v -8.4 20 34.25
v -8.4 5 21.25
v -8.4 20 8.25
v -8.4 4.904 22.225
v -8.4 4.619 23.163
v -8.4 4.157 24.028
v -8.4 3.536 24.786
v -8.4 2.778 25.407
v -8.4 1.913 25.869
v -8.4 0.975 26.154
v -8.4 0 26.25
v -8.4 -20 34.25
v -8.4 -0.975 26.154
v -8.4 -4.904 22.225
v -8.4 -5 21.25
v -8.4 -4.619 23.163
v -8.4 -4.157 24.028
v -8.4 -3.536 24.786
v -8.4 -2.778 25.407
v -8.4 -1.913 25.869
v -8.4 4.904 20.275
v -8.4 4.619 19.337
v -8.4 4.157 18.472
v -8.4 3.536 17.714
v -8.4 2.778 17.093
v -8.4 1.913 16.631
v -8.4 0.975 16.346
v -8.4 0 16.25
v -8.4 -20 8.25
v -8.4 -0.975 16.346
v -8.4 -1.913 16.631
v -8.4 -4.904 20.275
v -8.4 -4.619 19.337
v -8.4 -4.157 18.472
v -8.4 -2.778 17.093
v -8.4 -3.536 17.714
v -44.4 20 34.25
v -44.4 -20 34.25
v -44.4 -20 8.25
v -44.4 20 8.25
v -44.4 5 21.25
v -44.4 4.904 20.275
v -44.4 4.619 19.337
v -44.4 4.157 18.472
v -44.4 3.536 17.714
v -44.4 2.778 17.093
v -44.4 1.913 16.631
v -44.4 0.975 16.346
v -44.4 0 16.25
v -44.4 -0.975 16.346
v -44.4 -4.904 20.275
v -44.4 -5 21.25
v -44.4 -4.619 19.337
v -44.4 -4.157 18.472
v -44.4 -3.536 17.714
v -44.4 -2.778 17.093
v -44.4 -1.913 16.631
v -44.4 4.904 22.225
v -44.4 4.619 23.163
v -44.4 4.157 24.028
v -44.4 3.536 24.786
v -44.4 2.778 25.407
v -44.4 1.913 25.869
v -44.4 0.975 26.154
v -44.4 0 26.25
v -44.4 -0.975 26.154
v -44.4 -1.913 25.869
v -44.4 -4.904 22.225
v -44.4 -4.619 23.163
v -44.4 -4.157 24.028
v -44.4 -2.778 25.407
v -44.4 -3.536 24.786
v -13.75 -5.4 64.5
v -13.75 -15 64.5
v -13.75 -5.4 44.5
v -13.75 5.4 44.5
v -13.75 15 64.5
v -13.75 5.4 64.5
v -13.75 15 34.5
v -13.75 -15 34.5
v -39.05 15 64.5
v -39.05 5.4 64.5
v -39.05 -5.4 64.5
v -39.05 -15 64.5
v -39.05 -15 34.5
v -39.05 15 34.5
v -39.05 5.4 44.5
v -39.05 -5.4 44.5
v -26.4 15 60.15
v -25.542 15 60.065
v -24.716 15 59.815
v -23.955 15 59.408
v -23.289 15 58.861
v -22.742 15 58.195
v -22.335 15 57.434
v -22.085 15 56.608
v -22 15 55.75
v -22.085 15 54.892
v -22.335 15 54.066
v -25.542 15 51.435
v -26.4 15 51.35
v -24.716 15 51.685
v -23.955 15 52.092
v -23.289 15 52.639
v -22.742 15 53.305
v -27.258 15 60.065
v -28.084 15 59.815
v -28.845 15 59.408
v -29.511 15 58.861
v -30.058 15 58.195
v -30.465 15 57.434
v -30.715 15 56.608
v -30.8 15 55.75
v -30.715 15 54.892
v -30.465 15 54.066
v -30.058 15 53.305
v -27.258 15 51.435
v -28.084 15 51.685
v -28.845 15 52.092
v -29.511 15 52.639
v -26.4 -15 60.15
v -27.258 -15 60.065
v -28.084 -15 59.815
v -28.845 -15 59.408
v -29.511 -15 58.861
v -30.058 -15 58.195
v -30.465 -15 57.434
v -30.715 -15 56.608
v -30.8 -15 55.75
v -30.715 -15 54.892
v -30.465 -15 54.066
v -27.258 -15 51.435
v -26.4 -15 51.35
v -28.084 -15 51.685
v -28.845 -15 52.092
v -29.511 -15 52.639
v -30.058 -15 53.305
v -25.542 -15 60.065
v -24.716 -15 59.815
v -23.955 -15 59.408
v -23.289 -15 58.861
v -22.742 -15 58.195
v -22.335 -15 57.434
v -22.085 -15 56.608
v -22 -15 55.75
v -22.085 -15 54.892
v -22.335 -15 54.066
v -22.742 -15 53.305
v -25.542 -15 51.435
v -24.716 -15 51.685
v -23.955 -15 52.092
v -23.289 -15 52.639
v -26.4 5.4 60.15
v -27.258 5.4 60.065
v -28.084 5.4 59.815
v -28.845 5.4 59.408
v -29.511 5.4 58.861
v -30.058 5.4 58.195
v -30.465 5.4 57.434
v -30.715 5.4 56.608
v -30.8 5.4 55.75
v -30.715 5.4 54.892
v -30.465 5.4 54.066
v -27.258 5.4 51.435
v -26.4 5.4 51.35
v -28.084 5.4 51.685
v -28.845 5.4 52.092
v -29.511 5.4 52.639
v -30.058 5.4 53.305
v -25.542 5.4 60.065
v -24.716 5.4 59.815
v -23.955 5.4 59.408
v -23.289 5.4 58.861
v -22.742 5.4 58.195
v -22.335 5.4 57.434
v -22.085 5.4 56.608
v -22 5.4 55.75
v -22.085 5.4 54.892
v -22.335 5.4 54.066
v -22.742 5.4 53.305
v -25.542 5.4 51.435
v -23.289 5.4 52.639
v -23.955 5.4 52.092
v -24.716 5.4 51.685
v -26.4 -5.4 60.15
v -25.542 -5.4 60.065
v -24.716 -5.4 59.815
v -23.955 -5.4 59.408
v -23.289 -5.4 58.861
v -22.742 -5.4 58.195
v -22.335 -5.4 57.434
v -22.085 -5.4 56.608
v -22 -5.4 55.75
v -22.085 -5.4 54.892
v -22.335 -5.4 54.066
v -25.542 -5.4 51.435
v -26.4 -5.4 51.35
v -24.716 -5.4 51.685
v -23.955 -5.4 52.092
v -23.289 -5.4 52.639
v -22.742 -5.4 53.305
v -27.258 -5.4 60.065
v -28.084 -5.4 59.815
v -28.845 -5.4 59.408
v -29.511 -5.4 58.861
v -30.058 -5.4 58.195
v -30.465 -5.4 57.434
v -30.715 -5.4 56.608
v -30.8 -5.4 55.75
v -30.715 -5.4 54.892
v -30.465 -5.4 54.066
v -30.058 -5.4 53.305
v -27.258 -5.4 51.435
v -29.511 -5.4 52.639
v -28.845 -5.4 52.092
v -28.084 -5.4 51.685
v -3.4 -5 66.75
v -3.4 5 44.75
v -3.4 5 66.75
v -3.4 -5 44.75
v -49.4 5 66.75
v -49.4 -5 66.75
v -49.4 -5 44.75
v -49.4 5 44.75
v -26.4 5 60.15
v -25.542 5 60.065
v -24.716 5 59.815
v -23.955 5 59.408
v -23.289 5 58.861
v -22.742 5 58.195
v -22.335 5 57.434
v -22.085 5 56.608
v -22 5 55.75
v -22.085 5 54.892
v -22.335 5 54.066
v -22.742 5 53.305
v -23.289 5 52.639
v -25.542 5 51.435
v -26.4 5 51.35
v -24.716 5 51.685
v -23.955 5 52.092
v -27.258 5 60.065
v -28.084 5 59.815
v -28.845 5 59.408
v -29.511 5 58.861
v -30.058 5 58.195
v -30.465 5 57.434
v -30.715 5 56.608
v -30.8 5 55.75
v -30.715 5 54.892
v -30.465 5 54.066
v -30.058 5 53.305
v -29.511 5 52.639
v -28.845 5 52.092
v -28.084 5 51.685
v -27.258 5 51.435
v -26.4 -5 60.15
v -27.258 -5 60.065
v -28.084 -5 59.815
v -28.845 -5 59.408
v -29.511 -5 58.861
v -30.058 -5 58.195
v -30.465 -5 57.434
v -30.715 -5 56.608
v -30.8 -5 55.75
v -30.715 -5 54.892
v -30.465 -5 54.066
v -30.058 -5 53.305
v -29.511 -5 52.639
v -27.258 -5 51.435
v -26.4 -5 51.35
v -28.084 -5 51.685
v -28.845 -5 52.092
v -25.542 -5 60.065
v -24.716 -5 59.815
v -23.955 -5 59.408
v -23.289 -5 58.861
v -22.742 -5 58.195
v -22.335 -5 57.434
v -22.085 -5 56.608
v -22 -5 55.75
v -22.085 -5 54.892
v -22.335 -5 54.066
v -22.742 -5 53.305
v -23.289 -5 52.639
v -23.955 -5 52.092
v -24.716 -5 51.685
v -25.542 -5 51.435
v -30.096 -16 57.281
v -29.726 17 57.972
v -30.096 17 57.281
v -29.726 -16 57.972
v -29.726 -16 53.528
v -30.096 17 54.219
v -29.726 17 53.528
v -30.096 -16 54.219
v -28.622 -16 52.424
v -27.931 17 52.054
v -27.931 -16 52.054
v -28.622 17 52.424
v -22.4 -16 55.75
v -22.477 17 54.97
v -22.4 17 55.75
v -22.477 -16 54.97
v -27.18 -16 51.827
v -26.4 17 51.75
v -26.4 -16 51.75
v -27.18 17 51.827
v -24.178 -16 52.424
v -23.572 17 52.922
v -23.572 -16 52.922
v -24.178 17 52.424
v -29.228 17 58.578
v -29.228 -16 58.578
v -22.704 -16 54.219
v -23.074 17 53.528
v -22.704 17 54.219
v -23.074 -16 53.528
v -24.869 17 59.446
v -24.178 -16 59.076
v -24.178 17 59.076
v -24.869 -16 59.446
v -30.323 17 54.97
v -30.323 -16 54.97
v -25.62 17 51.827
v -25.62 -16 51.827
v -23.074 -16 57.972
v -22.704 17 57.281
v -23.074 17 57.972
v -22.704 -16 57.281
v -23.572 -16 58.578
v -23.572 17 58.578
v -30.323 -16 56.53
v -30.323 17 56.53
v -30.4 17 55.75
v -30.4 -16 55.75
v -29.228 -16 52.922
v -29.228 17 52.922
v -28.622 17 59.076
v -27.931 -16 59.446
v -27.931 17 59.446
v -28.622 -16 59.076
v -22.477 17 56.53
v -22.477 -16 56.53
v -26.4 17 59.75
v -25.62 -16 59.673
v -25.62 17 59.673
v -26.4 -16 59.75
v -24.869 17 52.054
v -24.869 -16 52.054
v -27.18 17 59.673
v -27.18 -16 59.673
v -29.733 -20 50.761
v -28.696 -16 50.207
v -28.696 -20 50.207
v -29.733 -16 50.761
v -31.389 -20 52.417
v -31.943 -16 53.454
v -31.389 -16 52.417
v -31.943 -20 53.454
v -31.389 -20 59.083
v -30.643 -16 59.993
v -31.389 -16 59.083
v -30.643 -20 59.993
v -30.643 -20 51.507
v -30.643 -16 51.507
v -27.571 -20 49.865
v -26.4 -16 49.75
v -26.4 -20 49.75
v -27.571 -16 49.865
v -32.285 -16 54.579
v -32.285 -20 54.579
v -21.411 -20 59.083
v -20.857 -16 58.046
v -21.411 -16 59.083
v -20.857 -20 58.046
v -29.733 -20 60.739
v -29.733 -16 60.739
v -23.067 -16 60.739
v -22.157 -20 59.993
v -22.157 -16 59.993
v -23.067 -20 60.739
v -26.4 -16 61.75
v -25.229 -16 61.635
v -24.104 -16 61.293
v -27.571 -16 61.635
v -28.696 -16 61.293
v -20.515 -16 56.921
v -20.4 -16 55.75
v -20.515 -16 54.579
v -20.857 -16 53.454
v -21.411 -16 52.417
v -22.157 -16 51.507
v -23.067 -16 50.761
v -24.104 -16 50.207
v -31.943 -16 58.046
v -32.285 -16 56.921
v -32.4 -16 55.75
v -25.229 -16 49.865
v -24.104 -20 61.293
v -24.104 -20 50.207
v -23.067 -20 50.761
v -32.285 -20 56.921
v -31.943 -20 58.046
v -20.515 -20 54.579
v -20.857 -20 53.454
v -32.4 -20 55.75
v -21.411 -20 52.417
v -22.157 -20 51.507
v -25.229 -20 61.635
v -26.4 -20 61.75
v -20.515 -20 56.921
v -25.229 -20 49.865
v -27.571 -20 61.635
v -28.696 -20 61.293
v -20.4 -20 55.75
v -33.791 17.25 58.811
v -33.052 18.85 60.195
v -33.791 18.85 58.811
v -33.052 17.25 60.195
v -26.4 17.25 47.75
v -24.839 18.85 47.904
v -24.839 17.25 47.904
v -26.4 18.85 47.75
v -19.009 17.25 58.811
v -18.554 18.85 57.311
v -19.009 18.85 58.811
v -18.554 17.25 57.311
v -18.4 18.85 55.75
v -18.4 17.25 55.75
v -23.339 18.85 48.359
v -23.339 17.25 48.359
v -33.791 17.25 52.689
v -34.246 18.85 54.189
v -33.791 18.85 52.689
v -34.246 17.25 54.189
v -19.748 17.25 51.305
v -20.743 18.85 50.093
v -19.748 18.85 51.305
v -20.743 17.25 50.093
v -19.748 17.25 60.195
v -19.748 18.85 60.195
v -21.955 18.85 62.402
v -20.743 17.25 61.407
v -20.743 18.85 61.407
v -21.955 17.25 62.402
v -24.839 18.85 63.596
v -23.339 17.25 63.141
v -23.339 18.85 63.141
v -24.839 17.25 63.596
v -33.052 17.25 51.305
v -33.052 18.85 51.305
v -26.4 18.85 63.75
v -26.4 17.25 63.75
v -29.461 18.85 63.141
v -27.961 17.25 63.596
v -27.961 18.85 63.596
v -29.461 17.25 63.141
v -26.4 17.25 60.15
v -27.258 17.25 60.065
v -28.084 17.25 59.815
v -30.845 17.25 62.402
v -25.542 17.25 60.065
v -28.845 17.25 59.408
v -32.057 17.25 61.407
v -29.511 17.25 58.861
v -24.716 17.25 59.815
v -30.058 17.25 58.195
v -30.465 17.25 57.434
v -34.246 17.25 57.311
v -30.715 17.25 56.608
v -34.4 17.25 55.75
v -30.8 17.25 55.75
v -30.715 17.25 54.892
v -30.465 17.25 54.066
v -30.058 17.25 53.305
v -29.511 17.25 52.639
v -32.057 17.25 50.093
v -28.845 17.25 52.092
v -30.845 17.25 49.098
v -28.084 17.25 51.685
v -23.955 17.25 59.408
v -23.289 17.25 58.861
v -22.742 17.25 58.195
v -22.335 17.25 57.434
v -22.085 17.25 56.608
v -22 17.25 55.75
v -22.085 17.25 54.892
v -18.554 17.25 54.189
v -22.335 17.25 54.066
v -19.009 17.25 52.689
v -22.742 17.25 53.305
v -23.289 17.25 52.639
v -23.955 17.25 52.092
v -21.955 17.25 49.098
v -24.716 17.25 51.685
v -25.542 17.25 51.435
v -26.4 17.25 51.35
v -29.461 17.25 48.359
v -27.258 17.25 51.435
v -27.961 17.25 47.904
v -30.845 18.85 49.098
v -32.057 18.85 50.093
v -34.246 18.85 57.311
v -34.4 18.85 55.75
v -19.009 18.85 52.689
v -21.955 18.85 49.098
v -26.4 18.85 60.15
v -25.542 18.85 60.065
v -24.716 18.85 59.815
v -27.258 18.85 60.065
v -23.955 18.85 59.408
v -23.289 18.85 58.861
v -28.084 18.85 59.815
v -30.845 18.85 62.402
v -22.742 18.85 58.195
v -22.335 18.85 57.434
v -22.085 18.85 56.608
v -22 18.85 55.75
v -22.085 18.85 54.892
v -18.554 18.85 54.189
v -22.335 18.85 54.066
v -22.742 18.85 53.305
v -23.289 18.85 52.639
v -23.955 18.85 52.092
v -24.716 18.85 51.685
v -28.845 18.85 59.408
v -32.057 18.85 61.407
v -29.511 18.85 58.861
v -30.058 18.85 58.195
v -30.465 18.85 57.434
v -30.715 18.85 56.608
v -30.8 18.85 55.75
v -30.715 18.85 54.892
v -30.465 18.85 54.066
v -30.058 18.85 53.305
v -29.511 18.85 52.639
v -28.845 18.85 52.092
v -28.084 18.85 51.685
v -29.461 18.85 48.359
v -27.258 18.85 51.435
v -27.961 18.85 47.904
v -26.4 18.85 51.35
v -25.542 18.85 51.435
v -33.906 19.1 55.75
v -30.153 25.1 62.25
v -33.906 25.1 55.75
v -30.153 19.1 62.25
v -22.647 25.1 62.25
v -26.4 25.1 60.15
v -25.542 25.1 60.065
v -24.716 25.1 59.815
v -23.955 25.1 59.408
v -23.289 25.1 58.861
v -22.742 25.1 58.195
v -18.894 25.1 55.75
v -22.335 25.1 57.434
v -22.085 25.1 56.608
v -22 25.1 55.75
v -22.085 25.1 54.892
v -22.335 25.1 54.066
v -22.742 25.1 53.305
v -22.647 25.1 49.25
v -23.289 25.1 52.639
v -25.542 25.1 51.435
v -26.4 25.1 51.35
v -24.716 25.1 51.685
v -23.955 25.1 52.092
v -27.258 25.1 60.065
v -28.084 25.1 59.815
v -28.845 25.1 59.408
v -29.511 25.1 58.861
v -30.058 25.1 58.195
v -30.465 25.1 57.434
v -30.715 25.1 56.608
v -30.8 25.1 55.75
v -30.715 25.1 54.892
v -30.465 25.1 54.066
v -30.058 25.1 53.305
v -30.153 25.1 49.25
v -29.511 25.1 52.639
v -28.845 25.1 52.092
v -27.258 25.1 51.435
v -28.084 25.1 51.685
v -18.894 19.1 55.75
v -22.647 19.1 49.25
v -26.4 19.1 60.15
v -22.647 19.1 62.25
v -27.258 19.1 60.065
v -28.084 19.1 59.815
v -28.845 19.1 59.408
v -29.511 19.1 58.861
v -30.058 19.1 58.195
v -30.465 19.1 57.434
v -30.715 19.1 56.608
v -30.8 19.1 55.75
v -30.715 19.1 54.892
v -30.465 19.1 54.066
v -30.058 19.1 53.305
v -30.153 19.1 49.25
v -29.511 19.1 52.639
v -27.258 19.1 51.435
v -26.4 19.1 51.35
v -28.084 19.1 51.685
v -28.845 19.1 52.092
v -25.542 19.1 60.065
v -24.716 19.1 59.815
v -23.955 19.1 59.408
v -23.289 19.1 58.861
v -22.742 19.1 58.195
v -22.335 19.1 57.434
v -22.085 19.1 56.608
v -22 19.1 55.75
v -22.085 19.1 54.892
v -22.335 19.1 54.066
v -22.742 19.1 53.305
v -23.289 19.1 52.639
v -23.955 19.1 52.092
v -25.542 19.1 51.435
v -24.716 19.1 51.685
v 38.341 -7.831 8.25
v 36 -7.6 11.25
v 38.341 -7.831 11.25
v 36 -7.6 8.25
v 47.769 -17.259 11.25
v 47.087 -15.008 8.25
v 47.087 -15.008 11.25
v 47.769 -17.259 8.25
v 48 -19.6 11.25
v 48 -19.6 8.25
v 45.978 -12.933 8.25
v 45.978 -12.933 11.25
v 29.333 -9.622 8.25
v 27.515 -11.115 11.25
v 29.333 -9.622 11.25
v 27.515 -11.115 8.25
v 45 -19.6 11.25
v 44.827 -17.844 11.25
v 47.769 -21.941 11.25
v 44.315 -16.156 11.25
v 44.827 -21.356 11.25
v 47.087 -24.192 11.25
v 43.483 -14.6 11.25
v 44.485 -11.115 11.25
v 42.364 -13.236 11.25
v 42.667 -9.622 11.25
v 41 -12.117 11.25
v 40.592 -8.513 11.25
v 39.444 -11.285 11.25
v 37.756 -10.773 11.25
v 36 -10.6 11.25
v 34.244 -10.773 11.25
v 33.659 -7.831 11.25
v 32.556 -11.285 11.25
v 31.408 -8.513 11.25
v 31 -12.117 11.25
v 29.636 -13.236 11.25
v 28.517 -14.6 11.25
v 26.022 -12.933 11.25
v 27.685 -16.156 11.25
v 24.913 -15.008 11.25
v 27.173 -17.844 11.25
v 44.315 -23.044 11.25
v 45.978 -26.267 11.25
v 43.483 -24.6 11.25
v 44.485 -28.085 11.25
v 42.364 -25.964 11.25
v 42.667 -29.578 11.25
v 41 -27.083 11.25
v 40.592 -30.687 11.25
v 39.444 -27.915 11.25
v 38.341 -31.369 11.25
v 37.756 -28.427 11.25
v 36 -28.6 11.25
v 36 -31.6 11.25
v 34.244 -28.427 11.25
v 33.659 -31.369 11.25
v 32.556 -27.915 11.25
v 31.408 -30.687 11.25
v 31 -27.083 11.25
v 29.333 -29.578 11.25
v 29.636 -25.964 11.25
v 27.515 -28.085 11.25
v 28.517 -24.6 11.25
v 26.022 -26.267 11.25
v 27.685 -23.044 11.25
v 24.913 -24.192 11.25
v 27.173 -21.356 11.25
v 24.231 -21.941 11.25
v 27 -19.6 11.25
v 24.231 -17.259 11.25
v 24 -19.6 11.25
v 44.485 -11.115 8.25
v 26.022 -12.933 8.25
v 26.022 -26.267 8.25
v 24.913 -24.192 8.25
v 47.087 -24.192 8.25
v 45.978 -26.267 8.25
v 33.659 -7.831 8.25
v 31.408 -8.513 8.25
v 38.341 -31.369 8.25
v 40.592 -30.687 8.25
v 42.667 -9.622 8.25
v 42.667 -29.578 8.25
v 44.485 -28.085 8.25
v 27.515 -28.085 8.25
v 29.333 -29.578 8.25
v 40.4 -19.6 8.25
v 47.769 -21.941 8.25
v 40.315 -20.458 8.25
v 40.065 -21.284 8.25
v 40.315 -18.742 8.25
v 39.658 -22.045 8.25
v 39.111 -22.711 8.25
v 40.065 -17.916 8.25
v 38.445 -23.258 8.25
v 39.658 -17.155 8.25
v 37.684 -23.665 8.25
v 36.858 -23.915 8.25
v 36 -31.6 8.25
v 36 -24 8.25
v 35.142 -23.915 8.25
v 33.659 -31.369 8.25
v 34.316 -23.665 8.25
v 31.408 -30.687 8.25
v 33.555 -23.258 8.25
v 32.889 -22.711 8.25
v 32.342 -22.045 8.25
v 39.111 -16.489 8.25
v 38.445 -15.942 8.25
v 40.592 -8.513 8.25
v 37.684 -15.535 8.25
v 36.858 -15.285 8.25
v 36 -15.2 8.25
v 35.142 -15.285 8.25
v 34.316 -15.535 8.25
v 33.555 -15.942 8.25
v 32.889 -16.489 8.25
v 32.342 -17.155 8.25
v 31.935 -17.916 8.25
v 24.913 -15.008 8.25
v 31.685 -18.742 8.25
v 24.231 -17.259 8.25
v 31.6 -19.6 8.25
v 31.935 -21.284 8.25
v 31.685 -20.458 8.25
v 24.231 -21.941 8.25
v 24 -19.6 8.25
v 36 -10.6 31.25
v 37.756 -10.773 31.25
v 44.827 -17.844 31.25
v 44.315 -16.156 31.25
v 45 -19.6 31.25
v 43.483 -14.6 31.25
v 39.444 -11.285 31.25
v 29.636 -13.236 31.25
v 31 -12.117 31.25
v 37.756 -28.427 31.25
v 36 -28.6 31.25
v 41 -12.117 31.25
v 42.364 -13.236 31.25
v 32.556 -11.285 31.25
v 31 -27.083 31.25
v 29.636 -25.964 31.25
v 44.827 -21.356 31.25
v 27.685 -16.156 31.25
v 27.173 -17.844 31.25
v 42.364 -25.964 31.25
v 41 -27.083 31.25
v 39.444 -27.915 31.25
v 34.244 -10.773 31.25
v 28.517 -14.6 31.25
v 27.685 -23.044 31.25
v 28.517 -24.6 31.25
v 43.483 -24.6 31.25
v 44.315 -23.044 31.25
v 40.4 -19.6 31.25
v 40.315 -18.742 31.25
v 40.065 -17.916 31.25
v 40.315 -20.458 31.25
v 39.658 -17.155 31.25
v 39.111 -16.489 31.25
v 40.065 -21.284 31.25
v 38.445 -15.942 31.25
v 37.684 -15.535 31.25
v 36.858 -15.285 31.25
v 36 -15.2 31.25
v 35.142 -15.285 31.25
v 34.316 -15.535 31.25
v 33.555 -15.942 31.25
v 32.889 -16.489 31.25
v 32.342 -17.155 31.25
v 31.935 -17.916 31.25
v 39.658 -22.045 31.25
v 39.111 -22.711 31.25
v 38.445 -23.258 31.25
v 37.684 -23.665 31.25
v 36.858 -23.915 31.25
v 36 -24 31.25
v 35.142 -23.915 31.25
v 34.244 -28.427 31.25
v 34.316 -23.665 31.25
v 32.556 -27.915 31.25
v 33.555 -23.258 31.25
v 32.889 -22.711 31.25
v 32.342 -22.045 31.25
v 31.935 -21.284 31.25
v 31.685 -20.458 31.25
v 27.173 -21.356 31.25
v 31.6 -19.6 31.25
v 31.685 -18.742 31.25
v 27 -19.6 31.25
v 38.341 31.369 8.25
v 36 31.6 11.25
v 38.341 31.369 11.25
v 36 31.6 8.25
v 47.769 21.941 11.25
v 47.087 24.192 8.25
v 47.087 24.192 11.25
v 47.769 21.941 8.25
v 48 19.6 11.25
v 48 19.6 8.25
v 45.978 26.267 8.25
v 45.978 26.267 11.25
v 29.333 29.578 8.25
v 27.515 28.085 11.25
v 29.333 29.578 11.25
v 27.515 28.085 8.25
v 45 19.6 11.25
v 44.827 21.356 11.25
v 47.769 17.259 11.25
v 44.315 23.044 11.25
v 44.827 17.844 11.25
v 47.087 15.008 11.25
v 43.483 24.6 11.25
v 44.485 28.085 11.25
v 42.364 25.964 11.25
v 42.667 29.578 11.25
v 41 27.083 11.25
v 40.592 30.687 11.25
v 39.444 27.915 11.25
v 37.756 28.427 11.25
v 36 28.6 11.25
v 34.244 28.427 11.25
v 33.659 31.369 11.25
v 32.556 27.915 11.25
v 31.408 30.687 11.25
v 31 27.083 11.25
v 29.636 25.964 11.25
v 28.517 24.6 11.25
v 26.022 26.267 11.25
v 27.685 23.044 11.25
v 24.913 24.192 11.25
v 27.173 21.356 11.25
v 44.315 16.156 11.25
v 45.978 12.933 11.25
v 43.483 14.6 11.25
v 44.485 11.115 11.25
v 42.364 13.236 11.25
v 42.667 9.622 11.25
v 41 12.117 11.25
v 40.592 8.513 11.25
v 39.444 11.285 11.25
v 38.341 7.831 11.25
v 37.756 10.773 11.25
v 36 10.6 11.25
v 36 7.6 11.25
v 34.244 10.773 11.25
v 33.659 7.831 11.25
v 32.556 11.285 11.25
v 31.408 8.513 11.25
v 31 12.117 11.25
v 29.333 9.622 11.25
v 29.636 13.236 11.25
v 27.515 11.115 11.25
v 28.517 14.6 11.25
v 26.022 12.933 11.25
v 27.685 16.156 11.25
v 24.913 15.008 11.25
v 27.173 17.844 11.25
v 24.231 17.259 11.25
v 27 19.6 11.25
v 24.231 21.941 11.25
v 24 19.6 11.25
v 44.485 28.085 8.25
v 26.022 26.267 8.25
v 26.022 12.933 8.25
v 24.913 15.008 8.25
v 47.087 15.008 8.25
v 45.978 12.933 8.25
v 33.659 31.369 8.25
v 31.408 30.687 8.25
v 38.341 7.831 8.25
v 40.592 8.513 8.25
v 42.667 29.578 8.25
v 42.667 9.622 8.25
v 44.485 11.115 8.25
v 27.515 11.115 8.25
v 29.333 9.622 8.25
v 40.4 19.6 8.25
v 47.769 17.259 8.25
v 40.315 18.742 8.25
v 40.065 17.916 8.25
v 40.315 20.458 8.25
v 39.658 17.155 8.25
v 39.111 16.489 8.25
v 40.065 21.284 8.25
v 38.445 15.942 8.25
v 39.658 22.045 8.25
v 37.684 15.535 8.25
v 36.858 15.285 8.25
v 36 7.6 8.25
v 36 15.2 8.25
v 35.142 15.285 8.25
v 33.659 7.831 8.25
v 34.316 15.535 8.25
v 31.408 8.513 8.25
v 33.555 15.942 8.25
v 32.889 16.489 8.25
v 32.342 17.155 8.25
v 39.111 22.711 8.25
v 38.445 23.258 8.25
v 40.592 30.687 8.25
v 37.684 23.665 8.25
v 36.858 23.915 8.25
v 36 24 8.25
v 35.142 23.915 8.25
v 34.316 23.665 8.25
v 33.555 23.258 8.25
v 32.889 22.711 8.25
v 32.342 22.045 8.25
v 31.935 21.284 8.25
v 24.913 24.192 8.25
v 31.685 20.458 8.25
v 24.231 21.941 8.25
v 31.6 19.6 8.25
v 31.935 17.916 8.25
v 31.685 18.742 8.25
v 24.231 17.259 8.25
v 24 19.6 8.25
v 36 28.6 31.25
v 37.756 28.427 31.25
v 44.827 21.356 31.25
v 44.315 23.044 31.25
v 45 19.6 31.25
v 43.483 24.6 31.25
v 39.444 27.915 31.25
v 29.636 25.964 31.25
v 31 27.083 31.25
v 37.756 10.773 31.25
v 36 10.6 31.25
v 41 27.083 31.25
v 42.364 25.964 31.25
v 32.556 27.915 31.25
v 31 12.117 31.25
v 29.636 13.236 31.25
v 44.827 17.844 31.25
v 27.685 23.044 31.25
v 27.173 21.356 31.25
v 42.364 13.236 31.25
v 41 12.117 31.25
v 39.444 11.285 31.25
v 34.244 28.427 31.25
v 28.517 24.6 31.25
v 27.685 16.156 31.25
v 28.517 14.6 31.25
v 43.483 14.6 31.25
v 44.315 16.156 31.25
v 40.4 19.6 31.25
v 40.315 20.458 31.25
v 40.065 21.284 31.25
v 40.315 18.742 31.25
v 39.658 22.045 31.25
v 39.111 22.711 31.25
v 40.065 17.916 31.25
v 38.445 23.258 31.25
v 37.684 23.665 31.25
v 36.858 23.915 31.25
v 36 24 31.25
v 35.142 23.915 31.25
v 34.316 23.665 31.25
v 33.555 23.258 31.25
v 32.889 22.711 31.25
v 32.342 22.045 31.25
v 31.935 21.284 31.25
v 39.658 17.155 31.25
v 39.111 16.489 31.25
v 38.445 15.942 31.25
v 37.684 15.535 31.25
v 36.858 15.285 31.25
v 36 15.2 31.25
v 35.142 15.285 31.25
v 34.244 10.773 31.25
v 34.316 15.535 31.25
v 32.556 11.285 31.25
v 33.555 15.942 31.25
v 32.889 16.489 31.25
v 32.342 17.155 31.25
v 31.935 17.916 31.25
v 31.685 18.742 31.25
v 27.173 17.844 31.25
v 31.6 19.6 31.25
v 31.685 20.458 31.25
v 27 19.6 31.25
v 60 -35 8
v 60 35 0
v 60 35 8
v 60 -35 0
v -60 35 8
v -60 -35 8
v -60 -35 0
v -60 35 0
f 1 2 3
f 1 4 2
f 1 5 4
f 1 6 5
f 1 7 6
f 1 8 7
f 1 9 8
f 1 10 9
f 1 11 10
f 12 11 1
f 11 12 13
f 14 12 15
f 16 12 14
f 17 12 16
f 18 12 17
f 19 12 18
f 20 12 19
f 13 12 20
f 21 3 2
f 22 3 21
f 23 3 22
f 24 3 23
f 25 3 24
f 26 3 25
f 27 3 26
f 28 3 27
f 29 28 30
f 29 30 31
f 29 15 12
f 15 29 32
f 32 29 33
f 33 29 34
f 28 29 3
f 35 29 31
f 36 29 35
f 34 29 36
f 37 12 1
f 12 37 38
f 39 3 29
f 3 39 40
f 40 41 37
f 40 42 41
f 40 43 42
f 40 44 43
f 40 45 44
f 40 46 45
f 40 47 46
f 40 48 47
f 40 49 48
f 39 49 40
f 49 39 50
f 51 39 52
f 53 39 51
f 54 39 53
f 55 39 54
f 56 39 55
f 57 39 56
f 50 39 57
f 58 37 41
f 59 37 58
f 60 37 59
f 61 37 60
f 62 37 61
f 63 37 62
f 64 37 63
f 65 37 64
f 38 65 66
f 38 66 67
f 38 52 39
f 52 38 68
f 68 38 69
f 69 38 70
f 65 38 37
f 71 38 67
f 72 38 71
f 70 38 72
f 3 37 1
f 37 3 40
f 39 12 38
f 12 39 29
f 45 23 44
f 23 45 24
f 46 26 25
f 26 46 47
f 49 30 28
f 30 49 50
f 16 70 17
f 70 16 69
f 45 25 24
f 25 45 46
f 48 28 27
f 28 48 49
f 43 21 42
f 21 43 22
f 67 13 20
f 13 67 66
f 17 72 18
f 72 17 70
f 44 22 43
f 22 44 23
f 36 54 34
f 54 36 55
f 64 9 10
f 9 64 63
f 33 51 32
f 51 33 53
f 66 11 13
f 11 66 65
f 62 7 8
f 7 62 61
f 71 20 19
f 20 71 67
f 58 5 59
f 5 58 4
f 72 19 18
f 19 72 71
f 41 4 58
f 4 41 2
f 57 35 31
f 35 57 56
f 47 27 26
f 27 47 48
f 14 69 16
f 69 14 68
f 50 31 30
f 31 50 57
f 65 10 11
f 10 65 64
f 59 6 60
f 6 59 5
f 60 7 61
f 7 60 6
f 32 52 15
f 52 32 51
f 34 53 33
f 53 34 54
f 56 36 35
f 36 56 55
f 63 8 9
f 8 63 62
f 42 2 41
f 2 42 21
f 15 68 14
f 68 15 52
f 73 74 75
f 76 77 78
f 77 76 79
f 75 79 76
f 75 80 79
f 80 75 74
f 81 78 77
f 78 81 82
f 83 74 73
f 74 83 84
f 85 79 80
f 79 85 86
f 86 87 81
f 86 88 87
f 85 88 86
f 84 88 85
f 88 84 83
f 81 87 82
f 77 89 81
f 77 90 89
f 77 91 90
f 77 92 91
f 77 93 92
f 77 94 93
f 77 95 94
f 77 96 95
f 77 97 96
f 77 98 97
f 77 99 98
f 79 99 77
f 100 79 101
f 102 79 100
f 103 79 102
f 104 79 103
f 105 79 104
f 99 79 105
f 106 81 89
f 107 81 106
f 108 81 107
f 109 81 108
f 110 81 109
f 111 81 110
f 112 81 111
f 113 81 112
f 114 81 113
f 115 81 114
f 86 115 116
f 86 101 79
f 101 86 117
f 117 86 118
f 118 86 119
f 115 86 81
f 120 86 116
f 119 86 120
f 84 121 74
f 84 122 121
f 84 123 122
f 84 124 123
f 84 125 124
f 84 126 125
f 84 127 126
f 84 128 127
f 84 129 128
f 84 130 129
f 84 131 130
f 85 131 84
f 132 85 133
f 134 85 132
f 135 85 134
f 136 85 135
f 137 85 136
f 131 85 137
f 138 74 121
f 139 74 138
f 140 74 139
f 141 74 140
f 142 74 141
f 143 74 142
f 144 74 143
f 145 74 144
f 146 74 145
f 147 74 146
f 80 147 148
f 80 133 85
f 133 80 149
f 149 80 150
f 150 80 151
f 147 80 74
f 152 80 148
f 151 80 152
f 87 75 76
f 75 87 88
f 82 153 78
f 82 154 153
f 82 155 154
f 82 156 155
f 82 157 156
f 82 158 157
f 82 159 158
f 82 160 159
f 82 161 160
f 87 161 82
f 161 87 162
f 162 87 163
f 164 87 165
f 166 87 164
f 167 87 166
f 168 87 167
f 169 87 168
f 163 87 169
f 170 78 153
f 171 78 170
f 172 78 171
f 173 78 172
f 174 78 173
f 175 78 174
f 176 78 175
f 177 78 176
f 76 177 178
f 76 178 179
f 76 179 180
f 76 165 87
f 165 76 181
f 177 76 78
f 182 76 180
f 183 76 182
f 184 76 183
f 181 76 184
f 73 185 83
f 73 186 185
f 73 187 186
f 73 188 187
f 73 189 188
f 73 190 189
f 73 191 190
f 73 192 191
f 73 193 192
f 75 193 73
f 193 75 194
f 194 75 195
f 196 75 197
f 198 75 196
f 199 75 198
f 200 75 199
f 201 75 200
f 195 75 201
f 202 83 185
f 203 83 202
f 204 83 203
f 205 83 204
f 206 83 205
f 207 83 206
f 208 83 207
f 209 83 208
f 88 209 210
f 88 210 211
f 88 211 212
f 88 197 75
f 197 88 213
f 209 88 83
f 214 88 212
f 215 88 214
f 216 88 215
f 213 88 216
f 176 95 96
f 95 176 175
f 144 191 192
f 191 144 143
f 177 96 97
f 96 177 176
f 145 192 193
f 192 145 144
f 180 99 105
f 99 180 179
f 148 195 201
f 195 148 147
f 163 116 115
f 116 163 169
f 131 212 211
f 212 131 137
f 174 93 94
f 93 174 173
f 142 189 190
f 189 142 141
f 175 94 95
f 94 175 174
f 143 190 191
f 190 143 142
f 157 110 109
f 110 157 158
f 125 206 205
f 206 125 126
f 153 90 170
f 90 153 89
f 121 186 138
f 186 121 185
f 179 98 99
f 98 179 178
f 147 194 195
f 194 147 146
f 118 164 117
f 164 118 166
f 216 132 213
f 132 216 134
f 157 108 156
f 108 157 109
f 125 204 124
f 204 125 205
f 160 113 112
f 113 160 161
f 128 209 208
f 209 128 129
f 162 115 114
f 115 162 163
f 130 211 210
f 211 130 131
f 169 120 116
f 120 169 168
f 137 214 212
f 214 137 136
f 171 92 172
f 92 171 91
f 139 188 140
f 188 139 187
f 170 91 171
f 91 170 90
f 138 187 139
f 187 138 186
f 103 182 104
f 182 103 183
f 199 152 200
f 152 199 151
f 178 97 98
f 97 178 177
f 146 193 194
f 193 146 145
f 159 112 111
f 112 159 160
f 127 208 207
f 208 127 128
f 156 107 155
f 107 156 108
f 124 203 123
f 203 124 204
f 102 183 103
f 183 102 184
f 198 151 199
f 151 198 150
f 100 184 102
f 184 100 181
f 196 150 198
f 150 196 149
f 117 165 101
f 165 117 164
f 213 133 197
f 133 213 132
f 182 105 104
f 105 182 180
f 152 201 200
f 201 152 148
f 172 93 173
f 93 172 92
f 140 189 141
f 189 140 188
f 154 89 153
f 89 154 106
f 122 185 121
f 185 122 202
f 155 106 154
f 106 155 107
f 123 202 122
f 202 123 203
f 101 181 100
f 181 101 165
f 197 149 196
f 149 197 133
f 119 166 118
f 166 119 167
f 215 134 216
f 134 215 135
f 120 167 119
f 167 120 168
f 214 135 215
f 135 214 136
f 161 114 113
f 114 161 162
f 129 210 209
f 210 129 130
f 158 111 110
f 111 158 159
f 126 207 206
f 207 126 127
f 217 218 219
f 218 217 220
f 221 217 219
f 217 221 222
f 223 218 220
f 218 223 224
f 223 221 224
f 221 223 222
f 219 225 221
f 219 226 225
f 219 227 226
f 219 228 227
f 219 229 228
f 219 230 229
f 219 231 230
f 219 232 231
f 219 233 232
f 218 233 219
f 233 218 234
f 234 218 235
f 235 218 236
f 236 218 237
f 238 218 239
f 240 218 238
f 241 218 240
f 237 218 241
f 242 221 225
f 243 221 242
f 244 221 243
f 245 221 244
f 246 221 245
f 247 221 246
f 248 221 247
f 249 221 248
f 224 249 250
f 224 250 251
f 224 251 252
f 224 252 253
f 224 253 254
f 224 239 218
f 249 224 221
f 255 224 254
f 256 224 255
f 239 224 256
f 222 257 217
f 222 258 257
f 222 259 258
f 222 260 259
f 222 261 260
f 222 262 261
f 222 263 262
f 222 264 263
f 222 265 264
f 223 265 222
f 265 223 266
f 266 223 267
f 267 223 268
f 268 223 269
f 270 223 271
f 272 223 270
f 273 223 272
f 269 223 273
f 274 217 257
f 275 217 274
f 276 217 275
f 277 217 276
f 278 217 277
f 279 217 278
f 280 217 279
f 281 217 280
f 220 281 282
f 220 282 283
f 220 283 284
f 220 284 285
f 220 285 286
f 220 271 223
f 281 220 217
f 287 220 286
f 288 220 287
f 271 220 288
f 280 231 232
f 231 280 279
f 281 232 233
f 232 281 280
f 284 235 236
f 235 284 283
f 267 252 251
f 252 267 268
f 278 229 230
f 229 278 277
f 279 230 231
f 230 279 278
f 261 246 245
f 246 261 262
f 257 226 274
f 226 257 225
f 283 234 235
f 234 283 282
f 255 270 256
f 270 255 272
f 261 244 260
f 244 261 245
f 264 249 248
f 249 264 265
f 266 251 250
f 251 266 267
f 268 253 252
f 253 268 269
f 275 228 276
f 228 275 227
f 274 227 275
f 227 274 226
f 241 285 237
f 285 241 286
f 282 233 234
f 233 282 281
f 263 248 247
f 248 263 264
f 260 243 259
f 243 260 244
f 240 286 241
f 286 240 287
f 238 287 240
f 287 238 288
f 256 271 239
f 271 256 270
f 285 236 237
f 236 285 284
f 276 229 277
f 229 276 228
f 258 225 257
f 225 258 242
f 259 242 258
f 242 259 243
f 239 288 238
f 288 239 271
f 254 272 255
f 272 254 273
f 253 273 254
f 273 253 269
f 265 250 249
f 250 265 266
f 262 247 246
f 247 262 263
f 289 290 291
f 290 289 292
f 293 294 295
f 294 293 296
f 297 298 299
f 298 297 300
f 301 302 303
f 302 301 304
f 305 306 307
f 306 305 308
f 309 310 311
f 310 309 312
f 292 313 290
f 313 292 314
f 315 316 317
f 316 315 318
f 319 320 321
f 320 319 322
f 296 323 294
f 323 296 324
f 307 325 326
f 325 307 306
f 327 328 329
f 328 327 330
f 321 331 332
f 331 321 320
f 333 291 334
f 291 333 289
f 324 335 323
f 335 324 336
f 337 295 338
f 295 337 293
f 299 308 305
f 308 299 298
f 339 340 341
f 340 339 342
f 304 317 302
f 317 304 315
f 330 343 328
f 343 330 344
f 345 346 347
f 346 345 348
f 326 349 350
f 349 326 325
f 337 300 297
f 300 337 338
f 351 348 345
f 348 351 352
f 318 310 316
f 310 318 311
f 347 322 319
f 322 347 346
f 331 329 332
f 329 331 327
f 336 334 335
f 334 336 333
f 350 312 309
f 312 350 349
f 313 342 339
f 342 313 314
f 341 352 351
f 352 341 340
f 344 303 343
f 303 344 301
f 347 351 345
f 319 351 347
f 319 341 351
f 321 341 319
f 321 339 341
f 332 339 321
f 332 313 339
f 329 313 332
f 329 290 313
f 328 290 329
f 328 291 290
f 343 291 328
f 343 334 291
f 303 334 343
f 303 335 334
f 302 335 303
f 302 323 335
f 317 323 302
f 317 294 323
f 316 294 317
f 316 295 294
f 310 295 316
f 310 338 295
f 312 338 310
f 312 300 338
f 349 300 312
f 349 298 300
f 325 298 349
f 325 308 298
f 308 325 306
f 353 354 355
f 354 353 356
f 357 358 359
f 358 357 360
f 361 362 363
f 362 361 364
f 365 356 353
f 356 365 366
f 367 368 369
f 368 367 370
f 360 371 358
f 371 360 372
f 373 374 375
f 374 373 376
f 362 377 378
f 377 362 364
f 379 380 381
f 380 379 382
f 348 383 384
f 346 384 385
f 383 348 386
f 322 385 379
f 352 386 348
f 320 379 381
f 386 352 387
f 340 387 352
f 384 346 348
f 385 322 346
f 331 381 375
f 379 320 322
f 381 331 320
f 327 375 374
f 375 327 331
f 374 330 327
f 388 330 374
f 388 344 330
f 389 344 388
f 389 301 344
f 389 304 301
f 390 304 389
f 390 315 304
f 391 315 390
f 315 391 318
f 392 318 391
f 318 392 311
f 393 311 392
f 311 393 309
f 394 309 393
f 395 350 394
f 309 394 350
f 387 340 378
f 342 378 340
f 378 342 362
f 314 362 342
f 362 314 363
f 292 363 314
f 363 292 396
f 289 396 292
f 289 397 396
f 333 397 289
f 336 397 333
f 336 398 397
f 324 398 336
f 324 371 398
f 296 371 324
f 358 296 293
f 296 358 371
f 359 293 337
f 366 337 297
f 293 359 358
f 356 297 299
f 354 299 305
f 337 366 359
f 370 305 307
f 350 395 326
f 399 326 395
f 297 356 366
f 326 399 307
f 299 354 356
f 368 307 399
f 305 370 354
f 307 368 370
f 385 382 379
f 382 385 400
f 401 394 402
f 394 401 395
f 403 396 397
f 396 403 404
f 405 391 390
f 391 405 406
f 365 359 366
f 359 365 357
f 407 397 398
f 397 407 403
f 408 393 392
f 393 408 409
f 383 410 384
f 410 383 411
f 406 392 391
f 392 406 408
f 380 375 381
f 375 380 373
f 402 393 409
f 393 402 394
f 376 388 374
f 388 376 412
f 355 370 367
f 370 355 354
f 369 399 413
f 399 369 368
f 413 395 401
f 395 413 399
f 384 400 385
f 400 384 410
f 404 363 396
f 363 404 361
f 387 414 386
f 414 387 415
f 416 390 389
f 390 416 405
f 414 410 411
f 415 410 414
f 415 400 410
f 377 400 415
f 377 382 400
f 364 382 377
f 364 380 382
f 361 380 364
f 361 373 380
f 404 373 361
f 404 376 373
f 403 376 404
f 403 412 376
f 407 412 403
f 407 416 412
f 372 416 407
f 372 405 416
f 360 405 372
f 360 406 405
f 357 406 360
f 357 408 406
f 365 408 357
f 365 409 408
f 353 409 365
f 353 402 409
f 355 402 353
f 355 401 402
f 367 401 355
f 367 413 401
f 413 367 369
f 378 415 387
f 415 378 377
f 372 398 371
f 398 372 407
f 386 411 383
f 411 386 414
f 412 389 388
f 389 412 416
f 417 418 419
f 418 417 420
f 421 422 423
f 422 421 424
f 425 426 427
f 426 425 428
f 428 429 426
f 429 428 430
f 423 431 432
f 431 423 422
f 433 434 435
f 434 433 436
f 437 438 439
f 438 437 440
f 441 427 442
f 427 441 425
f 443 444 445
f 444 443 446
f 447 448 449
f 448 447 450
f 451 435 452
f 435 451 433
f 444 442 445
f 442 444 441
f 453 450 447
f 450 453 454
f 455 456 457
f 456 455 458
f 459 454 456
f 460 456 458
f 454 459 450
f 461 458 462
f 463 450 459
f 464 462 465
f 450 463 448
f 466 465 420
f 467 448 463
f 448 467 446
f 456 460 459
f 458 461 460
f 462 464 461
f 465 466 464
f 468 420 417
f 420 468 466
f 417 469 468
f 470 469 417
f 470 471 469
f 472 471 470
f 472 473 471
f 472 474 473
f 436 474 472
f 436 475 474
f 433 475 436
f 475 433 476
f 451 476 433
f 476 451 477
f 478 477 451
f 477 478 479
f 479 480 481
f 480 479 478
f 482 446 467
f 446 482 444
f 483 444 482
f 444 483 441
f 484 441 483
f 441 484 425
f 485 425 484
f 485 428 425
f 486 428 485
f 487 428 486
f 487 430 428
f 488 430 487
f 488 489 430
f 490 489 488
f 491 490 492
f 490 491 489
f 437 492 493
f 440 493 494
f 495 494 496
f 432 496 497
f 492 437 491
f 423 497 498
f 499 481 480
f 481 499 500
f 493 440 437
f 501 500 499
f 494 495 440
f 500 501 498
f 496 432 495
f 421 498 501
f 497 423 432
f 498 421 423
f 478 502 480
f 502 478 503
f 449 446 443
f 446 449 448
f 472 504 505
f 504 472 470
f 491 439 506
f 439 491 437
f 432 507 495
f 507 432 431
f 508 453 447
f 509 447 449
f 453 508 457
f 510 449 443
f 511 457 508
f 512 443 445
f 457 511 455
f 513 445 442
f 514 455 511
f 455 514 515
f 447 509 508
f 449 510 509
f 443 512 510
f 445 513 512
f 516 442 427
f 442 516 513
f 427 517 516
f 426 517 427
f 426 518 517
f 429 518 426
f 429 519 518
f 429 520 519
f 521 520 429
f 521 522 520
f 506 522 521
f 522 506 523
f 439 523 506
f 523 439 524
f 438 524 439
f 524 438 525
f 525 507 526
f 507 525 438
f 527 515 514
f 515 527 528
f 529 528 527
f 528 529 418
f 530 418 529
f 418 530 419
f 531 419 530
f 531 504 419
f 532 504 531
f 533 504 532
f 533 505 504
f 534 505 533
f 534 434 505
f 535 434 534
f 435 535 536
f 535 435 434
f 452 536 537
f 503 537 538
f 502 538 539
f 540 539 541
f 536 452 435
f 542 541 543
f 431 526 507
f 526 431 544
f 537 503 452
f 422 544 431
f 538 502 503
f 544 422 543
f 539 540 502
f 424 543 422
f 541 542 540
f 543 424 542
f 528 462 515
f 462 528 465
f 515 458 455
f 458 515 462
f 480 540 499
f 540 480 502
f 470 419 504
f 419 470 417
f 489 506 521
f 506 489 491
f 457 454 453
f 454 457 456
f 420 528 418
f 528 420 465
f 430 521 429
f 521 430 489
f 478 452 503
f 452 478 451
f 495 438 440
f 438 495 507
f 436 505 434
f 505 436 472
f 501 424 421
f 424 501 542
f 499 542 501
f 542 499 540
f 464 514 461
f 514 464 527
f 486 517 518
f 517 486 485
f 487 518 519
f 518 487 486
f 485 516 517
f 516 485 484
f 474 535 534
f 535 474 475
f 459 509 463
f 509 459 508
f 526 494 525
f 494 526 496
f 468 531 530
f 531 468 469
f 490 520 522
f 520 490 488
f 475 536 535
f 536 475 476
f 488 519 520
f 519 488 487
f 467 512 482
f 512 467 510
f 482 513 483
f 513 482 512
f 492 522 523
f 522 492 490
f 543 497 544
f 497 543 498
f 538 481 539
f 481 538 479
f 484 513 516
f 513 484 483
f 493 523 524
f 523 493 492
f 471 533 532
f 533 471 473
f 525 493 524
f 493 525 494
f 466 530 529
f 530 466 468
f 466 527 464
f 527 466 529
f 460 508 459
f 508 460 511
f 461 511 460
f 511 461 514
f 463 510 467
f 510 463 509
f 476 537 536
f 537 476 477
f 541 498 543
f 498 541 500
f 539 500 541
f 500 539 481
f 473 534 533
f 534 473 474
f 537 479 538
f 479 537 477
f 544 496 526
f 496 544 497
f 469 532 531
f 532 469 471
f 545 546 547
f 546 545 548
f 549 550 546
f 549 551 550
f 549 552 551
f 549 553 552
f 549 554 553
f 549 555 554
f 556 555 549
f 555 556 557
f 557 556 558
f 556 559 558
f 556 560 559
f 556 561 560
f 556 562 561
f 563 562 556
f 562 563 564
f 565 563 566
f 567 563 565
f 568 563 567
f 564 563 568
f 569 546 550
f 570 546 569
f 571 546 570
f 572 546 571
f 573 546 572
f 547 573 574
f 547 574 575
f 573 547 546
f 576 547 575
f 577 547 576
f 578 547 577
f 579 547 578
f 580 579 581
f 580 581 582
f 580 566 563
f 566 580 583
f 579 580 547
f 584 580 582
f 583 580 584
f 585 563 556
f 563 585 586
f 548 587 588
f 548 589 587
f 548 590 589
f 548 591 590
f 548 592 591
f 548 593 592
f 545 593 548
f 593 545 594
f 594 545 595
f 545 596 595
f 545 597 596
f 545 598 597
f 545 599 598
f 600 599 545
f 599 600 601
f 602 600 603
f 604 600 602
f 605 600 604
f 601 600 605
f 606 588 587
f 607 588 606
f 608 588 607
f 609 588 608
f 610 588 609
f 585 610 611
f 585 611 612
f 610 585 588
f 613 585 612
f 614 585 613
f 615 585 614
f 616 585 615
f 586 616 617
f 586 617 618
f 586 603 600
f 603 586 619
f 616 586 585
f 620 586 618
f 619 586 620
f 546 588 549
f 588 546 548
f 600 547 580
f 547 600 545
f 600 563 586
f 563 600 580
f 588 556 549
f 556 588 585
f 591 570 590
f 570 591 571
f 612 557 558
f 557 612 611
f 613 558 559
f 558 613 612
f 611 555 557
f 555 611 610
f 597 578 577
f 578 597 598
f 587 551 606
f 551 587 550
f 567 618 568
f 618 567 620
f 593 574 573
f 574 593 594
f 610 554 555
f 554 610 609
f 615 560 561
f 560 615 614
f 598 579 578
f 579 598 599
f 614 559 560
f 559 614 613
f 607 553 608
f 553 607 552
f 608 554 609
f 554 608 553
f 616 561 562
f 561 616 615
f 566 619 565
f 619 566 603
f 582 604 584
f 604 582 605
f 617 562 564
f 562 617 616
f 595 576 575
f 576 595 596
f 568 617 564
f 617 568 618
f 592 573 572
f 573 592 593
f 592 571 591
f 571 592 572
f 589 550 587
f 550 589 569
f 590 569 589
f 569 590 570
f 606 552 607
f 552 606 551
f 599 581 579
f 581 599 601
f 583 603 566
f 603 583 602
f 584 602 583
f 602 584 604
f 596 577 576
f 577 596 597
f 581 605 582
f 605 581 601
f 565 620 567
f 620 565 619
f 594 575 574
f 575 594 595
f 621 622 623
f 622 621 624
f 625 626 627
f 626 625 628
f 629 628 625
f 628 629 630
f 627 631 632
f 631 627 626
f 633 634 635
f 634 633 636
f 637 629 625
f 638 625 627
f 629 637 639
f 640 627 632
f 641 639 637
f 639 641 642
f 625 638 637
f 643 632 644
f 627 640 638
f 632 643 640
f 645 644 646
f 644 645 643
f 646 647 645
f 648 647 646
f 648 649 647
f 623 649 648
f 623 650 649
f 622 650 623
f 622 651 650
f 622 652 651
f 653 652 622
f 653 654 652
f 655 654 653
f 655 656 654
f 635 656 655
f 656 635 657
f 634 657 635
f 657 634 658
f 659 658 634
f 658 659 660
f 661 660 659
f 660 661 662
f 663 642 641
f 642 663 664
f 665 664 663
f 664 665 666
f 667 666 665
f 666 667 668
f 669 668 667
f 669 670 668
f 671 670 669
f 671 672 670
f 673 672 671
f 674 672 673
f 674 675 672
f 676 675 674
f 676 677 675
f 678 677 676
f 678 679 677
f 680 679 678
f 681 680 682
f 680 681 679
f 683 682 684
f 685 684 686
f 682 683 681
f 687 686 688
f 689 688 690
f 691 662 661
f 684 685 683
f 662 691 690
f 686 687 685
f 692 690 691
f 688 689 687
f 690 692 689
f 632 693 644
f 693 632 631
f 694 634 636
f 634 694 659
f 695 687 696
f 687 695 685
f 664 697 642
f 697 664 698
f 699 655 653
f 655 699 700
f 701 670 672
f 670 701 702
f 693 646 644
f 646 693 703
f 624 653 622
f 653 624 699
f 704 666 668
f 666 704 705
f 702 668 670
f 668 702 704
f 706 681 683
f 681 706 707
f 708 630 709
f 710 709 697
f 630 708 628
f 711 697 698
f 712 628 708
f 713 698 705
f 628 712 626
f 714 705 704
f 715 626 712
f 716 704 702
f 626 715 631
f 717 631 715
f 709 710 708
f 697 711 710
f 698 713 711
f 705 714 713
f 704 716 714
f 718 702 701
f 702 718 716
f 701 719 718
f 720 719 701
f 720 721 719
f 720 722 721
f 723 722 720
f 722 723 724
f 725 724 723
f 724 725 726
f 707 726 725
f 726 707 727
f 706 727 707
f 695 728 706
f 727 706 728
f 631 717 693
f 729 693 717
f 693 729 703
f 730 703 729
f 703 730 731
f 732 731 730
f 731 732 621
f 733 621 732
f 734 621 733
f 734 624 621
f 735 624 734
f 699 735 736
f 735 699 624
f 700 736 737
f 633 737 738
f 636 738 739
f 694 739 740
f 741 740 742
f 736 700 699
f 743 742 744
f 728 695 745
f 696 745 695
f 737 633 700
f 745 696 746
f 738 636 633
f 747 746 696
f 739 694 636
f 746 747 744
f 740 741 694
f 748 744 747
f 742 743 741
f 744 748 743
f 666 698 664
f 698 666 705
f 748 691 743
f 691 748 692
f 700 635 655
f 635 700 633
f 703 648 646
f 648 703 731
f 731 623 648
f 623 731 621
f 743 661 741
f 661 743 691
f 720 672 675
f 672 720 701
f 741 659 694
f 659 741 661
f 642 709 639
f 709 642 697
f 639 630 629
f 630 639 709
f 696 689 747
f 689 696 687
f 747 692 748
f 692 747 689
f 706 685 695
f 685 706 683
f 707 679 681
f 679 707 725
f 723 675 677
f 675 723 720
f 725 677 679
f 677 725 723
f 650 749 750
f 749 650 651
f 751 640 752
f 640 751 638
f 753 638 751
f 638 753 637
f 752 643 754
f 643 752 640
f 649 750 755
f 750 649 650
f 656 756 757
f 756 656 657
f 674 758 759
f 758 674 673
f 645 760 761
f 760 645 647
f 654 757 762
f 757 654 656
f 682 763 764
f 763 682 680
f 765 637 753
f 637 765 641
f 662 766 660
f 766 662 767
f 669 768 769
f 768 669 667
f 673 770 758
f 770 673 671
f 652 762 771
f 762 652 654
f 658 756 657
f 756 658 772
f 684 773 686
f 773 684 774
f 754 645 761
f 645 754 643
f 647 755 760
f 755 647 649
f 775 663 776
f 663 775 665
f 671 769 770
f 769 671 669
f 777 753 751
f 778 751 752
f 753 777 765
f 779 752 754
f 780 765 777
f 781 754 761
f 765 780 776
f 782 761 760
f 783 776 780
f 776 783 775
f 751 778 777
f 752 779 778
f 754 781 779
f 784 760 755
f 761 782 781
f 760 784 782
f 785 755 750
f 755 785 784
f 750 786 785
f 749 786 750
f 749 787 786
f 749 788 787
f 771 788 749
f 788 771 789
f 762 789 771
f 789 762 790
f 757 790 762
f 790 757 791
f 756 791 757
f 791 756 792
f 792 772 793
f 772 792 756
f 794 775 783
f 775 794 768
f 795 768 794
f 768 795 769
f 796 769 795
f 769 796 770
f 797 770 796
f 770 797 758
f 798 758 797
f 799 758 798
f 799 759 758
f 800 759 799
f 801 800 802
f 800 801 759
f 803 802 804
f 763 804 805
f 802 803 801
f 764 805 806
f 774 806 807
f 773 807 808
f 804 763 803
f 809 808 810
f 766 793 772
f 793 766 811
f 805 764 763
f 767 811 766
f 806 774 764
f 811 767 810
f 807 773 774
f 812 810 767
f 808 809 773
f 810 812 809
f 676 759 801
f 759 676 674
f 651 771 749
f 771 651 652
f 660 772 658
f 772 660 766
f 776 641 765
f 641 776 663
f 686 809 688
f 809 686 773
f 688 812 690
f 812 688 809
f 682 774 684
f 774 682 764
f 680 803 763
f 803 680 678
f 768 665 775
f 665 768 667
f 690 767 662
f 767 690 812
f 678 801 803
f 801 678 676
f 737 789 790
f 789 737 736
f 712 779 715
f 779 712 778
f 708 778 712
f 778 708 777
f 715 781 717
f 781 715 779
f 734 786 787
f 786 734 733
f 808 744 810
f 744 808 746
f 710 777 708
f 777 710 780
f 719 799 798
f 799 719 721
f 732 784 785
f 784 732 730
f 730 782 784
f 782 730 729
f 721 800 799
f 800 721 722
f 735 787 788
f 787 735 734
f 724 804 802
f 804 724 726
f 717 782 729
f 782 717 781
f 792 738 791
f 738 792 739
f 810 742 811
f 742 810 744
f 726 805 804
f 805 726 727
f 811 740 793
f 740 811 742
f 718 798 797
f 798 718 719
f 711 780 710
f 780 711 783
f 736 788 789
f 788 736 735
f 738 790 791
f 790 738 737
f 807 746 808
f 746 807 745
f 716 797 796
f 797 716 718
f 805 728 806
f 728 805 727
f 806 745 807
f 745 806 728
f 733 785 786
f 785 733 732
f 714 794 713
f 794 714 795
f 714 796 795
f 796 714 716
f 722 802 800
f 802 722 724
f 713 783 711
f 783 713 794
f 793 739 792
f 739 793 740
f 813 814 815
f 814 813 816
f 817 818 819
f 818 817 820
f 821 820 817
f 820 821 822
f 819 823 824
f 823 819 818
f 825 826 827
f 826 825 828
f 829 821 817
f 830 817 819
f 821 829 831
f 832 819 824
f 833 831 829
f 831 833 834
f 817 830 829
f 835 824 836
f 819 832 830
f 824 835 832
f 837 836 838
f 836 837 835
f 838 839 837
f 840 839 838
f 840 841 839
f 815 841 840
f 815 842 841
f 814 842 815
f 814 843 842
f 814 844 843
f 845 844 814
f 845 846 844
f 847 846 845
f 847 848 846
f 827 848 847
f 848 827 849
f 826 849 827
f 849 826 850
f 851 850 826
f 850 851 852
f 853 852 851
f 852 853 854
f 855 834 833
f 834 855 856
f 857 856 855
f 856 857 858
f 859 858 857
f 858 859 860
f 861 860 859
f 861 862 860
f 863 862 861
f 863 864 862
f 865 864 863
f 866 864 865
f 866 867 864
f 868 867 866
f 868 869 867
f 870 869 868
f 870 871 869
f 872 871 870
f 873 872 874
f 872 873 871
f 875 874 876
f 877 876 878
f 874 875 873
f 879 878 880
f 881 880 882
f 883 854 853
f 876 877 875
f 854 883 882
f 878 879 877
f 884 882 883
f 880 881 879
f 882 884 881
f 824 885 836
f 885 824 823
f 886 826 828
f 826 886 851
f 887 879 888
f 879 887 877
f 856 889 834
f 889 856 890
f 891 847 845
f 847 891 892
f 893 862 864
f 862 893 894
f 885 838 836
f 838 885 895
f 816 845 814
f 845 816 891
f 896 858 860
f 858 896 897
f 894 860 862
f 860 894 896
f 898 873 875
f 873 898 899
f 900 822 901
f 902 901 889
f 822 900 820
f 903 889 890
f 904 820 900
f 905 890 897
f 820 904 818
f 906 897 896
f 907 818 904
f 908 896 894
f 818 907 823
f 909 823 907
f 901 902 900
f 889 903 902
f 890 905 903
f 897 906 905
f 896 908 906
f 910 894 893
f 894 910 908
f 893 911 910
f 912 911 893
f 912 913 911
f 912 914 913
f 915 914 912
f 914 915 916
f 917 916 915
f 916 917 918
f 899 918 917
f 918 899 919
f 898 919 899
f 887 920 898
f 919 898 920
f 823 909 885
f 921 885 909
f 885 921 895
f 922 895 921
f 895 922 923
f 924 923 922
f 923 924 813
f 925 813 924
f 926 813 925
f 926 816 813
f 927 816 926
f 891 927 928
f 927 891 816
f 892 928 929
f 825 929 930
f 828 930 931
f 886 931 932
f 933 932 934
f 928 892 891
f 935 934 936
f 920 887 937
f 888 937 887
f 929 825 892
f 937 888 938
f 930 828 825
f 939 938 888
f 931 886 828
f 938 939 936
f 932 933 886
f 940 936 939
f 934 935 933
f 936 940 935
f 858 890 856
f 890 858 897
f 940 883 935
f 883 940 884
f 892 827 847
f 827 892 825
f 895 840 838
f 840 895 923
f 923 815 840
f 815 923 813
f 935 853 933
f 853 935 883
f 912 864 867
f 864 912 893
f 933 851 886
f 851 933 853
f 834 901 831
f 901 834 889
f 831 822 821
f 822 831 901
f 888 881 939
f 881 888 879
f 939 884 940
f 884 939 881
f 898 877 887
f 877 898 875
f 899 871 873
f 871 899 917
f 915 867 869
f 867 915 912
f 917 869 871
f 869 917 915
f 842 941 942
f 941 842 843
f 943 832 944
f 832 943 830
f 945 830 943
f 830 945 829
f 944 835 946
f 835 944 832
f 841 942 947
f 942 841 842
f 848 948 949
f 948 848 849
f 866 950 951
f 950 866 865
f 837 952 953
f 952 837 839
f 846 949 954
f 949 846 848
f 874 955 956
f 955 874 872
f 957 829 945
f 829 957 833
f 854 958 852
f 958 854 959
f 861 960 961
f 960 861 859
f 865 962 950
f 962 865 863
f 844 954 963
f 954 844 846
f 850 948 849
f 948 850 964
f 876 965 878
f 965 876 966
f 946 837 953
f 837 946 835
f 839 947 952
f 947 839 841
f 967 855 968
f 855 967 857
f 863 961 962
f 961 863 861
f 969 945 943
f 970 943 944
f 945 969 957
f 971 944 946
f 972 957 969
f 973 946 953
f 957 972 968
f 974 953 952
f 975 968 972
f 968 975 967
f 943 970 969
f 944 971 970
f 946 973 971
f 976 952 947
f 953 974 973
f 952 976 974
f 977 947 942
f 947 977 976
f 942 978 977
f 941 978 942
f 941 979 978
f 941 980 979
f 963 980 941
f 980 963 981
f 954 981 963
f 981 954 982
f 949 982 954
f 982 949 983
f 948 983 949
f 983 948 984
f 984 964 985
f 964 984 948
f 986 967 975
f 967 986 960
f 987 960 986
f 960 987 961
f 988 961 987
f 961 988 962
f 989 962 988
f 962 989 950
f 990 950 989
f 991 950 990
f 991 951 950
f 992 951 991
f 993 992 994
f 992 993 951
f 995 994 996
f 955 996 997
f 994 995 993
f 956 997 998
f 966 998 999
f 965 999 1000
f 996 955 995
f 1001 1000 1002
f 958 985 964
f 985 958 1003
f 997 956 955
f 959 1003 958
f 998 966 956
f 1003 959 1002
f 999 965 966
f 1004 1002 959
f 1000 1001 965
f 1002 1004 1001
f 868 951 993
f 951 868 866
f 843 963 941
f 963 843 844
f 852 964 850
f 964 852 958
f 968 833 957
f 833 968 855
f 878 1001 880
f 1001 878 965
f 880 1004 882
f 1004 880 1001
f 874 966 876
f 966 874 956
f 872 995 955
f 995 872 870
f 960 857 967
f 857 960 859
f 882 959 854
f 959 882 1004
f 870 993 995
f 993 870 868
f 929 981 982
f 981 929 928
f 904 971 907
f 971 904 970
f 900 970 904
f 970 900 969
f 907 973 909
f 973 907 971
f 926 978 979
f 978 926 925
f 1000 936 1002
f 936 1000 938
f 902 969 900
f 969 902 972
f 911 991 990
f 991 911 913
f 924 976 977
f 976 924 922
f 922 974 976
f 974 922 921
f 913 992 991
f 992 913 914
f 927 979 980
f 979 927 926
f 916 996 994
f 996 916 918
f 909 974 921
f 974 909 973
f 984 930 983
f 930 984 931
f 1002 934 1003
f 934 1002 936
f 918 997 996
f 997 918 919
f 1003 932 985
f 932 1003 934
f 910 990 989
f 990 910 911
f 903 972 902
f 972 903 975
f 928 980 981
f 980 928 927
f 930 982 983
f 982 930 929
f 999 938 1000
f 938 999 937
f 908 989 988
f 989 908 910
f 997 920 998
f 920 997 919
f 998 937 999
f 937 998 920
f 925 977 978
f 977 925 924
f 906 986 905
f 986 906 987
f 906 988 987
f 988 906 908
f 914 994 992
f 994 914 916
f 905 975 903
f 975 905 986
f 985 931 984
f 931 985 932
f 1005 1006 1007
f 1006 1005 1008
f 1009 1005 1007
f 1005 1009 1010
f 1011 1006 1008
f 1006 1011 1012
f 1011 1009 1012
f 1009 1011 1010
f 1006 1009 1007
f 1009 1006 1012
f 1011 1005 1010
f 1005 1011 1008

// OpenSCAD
$fn = 32;

// ------------------------------------------------------------------------
// Indexing jig: plate 120 x 70 mm, pin d8
// Every part is its own module, assembly() places every instance.
// ------------------------------------------------------------------------

// --- part 1 ---
module jig_plate() {
  difference() {
    translate([-60, -35, 0]) cube([120, 70, 8]);
  }
}

// --- part 2 ---
module locator_block() {
  difference() {
    translate([-18, -20, 0]) cube([36, 40, 26]);
    translate([0, 0, 13]) rotate([0, 90, 0]) cylinder(h = 38, d = 10, center = true);
  }
}

// --- part 3 ---
module index_fork() {
  difference() {
    translate([-12.65, -15, 0]) cube([25.3, 30, 30]);
    translate([-13.65, -5.4, 10]) cube([27.3, 10.8, 21]);
    translate([0, 0, 21.25]) rotate([90, 0, 0]) cylinder(h = 32, d = 8.8, center = true);
  }
}

// --- part 4 ---
module index_arm() {
  difference() {
    translate([-23, -5, 0]) cube([46, 10, 22]);
    translate([0, 0, 11]) rotate([90, 0, 0]) cylinder(h = 12, d = 8.8, center = true);
  }
}

// --- part 5 ---
module index_pin() {
  rotate([0, 90, 0]) cylinder(h = 34, d = 8, center = true);
  translate([-20, 0, 0]) rotate([0, 90, 0]) cylinder(h = 4, d = 12);
}

// --- part 6 ---
module pin_washer() {
  difference() {
      translate([0, 0, 0]) cylinder(h = 1.6, d = 16);
      translate([0, 0, -1]) cylinder(h = 3.6, d = 8.8);
    }
}

// --- part 7 ---
module lock_nut() {
  difference() {
    linear_extrude(height = 6) polygon(points = [[7.506, 0], [3.753, 6.5], [-3.753, 6.5], [-7.506, 0], [-3.753, -6.5], [3.753, -6.5]]);
    translate([0, 0, -1]) cylinder(h = 8, d = 8.8);
  }
}

// --- part 8 ---
module guide_bush_a() {
  difference() {
    union() {
      cylinder(h = 3, d = 24);
      translate([0, 0, 3]) cylinder(h = 20, d = 18);
    }
    translate([0, 0, -1]) cylinder(h = 25, d = 8.8);
  }
}

// --- part 9 ---
module guide_bush_b() {
  difference() {
    union() {
      cylinder(h = 3, d = 24);
      translate([0, 0, 3]) cylinder(h = 20, d = 18);
    }
    translate([0, 0, -1]) cylinder(h = 25, d = 8.8);
  }
}

// --- assembly ---
module assembly() {
  color([0.80, 0.24, 0.20]) translate([0, 0, 0]) rotate([0, 0, 0]) jig_plate();
  color([0.20, 0.45, 0.75]) translate([-26.4, 0, 8.25]) rotate([0, 0, 0]) locator_block();
  color([0.25, 0.62, 0.32]) translate([-26.4, 0, 34.5]) rotate([0, 0, 0]) index_fork();
  color([0.92, 0.70, 0.18]) translate([-26.4, 0, 44.75]) rotate([0, 0, 0]) index_arm();
  color([0.58, 0.35, 0.70]) translate([-26.4, 0, 55.75]) rotate([0, 0, 90]) index_pin();
  color([0.16, 0.66, 0.66]) translate([-26.4, 18.85, 55.75]) rotate([90, 0, 0]) pin_washer();
  color([0.85, 0.48, 0.18]) translate([-26.4, 25.1, 55.75]) rotate([90, 0, 0]) lock_nut();
  color([0.55, 0.60, 0.65]) translate([36, -19.6, 8.25]) rotate([0, 0, 0]) guide_bush_a();
  color([0.75, 0.30, 0.55]) translate([36, 19.6, 8.25]) rotate([0, 0, 0]) guide_bush_b();
}

assembly();
